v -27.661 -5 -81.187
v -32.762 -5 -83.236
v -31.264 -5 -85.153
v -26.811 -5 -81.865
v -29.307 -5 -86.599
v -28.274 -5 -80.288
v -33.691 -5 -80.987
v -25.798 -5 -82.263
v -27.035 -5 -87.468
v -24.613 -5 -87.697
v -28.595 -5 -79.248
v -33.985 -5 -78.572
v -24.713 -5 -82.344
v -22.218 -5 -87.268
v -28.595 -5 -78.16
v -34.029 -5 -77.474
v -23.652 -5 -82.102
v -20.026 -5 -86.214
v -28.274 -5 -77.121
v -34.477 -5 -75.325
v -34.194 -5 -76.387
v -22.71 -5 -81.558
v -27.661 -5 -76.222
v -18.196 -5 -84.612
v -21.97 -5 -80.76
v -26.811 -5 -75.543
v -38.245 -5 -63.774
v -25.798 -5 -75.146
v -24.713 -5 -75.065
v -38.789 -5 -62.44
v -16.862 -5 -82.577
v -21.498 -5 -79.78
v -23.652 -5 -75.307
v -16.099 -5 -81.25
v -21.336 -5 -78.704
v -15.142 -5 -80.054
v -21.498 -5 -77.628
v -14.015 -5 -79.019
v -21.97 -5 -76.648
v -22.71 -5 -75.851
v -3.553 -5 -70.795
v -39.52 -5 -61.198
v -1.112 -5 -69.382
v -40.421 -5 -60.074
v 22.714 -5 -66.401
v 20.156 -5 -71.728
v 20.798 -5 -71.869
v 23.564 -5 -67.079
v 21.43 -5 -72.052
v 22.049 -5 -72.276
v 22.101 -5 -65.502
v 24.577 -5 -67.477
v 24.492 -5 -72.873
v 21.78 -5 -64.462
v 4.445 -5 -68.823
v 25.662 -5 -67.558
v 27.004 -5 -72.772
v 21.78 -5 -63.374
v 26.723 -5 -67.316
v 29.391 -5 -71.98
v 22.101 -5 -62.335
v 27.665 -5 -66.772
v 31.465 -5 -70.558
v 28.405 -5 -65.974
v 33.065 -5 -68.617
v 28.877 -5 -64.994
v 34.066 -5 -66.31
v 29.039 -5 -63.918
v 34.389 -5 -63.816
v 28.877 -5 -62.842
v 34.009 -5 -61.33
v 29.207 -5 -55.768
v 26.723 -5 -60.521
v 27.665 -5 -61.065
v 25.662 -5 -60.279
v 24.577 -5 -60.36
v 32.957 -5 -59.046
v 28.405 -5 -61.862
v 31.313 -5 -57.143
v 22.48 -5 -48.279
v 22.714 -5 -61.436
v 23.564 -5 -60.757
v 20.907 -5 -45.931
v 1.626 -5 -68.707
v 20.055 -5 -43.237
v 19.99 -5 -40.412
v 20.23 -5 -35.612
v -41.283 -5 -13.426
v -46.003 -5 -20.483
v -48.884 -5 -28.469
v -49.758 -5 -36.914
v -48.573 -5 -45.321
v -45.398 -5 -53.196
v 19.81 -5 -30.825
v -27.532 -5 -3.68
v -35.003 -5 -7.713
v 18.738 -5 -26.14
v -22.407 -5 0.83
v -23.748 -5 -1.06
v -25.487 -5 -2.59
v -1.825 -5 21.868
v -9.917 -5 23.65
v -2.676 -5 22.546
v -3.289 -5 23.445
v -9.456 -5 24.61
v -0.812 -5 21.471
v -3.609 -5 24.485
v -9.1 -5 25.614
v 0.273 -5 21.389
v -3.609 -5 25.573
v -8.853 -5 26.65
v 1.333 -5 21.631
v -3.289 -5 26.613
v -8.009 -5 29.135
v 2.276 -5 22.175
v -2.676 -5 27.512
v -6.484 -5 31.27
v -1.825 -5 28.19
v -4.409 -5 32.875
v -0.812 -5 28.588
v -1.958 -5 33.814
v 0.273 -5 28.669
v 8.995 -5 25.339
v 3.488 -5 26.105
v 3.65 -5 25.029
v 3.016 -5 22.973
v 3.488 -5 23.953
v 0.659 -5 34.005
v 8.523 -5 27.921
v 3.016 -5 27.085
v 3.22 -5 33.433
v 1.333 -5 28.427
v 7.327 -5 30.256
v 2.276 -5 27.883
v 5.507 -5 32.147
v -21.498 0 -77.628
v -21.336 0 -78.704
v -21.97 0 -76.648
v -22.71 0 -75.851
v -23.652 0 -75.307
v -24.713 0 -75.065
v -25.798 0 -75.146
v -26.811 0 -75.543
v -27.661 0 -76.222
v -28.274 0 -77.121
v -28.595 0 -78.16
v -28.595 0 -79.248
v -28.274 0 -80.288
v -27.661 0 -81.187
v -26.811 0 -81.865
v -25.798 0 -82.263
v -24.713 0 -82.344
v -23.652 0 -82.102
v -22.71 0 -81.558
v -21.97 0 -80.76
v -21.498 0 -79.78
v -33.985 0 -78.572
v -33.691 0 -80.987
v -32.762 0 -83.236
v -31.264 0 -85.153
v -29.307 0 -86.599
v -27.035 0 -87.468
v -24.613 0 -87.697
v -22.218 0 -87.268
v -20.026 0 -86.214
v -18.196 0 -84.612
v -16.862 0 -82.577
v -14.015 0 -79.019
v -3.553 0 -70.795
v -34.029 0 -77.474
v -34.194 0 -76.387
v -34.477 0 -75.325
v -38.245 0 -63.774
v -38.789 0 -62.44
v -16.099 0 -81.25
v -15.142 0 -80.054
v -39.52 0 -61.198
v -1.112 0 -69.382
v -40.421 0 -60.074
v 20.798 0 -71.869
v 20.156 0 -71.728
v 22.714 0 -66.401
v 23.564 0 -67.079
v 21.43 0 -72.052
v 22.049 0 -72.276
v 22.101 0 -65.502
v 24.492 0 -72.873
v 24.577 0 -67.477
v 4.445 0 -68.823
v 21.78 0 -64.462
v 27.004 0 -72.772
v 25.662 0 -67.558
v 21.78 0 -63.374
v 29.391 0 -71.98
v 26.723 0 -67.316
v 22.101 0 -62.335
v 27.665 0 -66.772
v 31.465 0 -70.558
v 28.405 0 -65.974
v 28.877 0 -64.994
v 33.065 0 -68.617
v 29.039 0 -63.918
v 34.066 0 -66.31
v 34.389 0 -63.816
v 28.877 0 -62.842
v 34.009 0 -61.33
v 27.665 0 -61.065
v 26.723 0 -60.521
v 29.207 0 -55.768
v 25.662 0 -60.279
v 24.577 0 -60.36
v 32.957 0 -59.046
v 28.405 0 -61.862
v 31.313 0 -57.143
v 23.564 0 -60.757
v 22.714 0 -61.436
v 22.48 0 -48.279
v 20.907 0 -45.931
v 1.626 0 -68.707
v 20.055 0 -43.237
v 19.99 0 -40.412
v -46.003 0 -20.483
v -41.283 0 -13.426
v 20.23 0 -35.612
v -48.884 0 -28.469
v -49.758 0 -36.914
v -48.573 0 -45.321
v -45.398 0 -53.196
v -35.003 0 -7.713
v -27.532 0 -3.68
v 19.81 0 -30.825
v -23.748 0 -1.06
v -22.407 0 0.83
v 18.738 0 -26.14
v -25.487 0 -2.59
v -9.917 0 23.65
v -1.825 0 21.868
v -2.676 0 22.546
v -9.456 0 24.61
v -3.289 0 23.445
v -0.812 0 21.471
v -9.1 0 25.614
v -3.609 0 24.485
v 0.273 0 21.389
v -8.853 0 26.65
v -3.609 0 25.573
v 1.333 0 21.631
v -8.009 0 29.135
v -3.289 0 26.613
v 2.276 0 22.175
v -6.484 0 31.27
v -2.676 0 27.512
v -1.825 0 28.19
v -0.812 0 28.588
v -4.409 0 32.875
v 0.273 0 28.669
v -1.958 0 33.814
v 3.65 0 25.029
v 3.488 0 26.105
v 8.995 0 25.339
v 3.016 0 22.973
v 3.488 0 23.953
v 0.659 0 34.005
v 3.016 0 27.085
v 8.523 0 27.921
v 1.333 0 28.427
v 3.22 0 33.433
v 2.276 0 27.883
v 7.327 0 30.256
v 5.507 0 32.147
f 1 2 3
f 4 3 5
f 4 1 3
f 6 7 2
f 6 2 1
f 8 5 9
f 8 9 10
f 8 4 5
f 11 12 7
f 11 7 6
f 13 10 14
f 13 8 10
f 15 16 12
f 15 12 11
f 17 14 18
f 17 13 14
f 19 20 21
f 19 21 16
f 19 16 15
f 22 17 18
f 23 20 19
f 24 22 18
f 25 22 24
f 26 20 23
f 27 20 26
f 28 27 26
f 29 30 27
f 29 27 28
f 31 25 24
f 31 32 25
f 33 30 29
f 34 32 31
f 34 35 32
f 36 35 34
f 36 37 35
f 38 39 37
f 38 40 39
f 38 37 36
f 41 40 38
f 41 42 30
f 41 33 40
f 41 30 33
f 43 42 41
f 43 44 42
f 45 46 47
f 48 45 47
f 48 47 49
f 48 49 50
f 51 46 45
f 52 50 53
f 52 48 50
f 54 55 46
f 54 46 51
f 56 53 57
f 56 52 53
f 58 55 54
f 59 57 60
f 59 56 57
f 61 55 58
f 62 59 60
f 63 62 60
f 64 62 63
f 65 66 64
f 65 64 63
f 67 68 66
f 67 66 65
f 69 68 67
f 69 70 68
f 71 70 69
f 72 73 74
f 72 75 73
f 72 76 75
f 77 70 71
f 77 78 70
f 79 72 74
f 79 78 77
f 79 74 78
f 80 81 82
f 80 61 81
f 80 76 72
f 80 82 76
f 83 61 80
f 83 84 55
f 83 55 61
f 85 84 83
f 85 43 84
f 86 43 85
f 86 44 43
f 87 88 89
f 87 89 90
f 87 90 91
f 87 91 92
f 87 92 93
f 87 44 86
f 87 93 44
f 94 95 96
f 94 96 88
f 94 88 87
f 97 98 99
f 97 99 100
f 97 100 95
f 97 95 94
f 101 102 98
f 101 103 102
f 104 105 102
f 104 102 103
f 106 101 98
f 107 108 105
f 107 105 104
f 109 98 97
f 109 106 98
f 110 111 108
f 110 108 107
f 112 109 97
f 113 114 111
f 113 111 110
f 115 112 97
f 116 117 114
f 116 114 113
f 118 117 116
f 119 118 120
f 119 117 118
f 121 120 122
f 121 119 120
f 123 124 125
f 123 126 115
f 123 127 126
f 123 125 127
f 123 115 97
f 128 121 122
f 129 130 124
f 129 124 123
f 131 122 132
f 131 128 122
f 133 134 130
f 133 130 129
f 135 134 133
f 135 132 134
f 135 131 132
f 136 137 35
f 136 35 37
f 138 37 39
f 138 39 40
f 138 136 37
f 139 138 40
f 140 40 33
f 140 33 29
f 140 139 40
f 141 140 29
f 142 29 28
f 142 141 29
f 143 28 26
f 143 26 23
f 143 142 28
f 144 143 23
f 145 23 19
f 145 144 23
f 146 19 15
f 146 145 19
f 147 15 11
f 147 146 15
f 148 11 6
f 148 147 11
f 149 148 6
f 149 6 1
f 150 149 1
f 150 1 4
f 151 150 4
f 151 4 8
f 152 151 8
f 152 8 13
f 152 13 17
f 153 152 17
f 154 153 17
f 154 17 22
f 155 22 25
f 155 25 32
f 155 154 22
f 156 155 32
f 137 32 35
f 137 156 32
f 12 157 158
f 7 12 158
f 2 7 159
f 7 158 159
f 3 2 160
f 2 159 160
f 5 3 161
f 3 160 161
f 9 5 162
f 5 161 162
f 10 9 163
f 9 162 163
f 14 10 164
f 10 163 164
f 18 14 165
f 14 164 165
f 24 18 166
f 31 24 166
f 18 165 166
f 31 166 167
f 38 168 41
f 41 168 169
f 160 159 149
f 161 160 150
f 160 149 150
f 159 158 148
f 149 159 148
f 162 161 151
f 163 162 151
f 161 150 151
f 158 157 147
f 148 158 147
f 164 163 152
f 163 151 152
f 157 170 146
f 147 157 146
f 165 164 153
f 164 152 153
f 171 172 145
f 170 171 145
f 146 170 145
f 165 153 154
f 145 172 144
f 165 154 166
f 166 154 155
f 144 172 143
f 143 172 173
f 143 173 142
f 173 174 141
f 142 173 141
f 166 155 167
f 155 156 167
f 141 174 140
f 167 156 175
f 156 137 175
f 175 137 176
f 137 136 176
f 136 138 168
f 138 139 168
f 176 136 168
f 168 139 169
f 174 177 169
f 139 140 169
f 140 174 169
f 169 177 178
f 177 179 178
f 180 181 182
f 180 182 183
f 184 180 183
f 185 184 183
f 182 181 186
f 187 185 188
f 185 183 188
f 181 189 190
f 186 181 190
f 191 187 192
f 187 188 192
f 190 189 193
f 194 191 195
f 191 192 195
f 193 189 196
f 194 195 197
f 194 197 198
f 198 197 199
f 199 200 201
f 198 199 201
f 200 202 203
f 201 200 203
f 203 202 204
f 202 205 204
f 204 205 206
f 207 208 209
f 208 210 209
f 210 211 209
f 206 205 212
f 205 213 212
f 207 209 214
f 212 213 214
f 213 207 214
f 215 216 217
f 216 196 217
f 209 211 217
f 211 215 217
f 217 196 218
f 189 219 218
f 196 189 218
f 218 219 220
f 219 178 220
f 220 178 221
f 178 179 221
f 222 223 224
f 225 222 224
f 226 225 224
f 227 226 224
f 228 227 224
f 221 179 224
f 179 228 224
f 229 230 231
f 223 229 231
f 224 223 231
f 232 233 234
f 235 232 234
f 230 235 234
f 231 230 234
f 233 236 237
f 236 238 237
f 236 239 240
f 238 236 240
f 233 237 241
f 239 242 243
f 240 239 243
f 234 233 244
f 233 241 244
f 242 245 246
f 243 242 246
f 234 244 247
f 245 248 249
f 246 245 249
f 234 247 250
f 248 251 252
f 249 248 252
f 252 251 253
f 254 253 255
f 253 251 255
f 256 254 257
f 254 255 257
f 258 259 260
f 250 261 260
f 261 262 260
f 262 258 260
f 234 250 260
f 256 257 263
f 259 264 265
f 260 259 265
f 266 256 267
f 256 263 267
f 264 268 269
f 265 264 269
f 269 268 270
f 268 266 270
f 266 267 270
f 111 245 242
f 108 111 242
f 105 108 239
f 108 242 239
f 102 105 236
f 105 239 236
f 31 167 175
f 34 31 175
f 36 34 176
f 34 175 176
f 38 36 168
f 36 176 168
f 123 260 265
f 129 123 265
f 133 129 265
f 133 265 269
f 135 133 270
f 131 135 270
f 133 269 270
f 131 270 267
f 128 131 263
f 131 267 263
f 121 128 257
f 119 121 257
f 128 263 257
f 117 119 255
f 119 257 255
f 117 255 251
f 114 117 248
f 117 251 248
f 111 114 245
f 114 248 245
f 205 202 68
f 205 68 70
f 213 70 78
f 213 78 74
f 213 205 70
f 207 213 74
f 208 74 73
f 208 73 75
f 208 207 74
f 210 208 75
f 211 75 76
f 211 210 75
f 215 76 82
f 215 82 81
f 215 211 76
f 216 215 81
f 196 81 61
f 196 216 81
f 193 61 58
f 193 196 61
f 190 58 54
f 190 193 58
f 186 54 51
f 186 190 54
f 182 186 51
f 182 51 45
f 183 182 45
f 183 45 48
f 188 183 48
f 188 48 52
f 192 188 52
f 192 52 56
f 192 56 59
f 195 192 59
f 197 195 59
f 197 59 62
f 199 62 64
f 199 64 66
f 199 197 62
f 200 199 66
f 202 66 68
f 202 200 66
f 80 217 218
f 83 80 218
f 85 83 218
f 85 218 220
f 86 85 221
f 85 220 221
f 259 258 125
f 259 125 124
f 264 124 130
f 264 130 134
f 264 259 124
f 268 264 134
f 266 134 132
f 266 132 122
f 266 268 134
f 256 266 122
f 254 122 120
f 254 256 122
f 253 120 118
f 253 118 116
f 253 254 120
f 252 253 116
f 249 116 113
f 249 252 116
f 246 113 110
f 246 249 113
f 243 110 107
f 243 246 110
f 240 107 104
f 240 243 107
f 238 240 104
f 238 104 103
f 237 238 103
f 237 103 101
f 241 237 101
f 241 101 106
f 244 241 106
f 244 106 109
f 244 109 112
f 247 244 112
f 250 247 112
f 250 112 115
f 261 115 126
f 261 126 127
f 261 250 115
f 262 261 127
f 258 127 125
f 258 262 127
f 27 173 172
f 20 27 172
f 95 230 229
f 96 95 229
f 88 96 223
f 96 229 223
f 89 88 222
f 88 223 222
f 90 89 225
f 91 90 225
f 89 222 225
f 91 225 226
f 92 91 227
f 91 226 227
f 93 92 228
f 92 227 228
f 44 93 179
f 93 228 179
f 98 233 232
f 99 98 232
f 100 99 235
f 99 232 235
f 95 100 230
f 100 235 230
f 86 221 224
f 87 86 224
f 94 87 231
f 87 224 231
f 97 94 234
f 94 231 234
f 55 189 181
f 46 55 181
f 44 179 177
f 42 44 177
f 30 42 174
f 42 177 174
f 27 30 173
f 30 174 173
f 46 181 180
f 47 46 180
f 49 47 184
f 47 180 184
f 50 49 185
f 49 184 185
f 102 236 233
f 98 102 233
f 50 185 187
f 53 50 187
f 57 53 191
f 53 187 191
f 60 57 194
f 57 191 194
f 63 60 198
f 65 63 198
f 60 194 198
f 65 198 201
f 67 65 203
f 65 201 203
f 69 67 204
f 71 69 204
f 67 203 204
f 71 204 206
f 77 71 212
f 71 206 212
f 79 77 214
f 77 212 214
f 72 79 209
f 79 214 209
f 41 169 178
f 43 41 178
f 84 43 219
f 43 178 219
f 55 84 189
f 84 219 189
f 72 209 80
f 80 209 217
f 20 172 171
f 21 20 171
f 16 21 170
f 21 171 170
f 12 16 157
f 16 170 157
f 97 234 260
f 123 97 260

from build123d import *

# Parameters (mm, degrees)
F0_R     = 3.65
F1_DEPTH = 5


with BuildPart() as f1:
    # F0 (on Front) → F1 (new body)
    with BuildSketch(Plane.XZ):
        with BuildLine():
            Line((18.738222, -26.13953), (8.994647, 25.339406))
            ThreePointArc((8.994647, 25.339406), (0.659117, 34.004884), (-8.852828, 26.649989))
            ThreePointArc((-8.852828, 26.649989), (-9.264911, 25.107257), (-9.9173, 23.649785))
            Line((-9.9173, 23.649785), (-22.407404, 0.830026))
            ThreePointArc((-22.407404, 0.830026), (-24.572798, -1.875574), (-27.531595, -3.679662))
            ThreePointArc((-27.531595, -3.679662), (-48.884356, -28.469314), (-40.421234, -60.073789))
            ThreePointArc((-40.421234, -60.073789), (-39.132184, -61.805731), (-38.244918, -63.773987))
            Line((-38.244918, -63.773987), (-34.476732, -75.324515))
            ThreePointArc((-34.476732, -75.324515), (-34.096429, -76.928149), (-33.984688, -78.572467))
            ThreePointArc((-33.984688, -78.572467), (-27.035203, -87.467818), (-16.861534, -82.577107))
            ThreePointArc((-16.861534, -82.577107), (-15.643593, -80.633495), (-14.014829, -79.018525))
            Line((-14.014829, -79.018525), (-3.553493, -70.79486))
            ThreePointArc((-3.553493, -70.79486), (0.233142, -68.947223), (4.444673, -68.823224))
            Line((4.444673, -68.823224), (20.155766, -71.728023))
            ThreePointArc((20.155766, -71.728023), (21.115911, -71.955038), (22.049012, -72.275563))
            ThreePointArc((22.049012, -72.275563), (33.646241, -67.499015), (29.20736, -55.768394))
            Line((29.20736, -55.768394), (22.479737, -48.278609))
            ThreePointArc((22.479737, -48.278609), (20.385469, -44.614186), (19.989534, -40.412139))
            ThreePointArc((19.989534, -40.412139), (20.102008, -33.211121), (18.738222, -26.13953))
        make_face()
        with Locations((-24.985654, -78.704294)):
            Circle(F0_R, mode=Mode.SUBTRACT)
        with Locations((25.389197, -63.918341)):
            Circle(F0_R, mode=Mode.SUBTRACT)
        with Locations((0, 25.029052)):
            Circle(F0_R, mode=Mode.SUBTRACT)
    extrude(amount=F1_DEPTH)


solid = f1.part
